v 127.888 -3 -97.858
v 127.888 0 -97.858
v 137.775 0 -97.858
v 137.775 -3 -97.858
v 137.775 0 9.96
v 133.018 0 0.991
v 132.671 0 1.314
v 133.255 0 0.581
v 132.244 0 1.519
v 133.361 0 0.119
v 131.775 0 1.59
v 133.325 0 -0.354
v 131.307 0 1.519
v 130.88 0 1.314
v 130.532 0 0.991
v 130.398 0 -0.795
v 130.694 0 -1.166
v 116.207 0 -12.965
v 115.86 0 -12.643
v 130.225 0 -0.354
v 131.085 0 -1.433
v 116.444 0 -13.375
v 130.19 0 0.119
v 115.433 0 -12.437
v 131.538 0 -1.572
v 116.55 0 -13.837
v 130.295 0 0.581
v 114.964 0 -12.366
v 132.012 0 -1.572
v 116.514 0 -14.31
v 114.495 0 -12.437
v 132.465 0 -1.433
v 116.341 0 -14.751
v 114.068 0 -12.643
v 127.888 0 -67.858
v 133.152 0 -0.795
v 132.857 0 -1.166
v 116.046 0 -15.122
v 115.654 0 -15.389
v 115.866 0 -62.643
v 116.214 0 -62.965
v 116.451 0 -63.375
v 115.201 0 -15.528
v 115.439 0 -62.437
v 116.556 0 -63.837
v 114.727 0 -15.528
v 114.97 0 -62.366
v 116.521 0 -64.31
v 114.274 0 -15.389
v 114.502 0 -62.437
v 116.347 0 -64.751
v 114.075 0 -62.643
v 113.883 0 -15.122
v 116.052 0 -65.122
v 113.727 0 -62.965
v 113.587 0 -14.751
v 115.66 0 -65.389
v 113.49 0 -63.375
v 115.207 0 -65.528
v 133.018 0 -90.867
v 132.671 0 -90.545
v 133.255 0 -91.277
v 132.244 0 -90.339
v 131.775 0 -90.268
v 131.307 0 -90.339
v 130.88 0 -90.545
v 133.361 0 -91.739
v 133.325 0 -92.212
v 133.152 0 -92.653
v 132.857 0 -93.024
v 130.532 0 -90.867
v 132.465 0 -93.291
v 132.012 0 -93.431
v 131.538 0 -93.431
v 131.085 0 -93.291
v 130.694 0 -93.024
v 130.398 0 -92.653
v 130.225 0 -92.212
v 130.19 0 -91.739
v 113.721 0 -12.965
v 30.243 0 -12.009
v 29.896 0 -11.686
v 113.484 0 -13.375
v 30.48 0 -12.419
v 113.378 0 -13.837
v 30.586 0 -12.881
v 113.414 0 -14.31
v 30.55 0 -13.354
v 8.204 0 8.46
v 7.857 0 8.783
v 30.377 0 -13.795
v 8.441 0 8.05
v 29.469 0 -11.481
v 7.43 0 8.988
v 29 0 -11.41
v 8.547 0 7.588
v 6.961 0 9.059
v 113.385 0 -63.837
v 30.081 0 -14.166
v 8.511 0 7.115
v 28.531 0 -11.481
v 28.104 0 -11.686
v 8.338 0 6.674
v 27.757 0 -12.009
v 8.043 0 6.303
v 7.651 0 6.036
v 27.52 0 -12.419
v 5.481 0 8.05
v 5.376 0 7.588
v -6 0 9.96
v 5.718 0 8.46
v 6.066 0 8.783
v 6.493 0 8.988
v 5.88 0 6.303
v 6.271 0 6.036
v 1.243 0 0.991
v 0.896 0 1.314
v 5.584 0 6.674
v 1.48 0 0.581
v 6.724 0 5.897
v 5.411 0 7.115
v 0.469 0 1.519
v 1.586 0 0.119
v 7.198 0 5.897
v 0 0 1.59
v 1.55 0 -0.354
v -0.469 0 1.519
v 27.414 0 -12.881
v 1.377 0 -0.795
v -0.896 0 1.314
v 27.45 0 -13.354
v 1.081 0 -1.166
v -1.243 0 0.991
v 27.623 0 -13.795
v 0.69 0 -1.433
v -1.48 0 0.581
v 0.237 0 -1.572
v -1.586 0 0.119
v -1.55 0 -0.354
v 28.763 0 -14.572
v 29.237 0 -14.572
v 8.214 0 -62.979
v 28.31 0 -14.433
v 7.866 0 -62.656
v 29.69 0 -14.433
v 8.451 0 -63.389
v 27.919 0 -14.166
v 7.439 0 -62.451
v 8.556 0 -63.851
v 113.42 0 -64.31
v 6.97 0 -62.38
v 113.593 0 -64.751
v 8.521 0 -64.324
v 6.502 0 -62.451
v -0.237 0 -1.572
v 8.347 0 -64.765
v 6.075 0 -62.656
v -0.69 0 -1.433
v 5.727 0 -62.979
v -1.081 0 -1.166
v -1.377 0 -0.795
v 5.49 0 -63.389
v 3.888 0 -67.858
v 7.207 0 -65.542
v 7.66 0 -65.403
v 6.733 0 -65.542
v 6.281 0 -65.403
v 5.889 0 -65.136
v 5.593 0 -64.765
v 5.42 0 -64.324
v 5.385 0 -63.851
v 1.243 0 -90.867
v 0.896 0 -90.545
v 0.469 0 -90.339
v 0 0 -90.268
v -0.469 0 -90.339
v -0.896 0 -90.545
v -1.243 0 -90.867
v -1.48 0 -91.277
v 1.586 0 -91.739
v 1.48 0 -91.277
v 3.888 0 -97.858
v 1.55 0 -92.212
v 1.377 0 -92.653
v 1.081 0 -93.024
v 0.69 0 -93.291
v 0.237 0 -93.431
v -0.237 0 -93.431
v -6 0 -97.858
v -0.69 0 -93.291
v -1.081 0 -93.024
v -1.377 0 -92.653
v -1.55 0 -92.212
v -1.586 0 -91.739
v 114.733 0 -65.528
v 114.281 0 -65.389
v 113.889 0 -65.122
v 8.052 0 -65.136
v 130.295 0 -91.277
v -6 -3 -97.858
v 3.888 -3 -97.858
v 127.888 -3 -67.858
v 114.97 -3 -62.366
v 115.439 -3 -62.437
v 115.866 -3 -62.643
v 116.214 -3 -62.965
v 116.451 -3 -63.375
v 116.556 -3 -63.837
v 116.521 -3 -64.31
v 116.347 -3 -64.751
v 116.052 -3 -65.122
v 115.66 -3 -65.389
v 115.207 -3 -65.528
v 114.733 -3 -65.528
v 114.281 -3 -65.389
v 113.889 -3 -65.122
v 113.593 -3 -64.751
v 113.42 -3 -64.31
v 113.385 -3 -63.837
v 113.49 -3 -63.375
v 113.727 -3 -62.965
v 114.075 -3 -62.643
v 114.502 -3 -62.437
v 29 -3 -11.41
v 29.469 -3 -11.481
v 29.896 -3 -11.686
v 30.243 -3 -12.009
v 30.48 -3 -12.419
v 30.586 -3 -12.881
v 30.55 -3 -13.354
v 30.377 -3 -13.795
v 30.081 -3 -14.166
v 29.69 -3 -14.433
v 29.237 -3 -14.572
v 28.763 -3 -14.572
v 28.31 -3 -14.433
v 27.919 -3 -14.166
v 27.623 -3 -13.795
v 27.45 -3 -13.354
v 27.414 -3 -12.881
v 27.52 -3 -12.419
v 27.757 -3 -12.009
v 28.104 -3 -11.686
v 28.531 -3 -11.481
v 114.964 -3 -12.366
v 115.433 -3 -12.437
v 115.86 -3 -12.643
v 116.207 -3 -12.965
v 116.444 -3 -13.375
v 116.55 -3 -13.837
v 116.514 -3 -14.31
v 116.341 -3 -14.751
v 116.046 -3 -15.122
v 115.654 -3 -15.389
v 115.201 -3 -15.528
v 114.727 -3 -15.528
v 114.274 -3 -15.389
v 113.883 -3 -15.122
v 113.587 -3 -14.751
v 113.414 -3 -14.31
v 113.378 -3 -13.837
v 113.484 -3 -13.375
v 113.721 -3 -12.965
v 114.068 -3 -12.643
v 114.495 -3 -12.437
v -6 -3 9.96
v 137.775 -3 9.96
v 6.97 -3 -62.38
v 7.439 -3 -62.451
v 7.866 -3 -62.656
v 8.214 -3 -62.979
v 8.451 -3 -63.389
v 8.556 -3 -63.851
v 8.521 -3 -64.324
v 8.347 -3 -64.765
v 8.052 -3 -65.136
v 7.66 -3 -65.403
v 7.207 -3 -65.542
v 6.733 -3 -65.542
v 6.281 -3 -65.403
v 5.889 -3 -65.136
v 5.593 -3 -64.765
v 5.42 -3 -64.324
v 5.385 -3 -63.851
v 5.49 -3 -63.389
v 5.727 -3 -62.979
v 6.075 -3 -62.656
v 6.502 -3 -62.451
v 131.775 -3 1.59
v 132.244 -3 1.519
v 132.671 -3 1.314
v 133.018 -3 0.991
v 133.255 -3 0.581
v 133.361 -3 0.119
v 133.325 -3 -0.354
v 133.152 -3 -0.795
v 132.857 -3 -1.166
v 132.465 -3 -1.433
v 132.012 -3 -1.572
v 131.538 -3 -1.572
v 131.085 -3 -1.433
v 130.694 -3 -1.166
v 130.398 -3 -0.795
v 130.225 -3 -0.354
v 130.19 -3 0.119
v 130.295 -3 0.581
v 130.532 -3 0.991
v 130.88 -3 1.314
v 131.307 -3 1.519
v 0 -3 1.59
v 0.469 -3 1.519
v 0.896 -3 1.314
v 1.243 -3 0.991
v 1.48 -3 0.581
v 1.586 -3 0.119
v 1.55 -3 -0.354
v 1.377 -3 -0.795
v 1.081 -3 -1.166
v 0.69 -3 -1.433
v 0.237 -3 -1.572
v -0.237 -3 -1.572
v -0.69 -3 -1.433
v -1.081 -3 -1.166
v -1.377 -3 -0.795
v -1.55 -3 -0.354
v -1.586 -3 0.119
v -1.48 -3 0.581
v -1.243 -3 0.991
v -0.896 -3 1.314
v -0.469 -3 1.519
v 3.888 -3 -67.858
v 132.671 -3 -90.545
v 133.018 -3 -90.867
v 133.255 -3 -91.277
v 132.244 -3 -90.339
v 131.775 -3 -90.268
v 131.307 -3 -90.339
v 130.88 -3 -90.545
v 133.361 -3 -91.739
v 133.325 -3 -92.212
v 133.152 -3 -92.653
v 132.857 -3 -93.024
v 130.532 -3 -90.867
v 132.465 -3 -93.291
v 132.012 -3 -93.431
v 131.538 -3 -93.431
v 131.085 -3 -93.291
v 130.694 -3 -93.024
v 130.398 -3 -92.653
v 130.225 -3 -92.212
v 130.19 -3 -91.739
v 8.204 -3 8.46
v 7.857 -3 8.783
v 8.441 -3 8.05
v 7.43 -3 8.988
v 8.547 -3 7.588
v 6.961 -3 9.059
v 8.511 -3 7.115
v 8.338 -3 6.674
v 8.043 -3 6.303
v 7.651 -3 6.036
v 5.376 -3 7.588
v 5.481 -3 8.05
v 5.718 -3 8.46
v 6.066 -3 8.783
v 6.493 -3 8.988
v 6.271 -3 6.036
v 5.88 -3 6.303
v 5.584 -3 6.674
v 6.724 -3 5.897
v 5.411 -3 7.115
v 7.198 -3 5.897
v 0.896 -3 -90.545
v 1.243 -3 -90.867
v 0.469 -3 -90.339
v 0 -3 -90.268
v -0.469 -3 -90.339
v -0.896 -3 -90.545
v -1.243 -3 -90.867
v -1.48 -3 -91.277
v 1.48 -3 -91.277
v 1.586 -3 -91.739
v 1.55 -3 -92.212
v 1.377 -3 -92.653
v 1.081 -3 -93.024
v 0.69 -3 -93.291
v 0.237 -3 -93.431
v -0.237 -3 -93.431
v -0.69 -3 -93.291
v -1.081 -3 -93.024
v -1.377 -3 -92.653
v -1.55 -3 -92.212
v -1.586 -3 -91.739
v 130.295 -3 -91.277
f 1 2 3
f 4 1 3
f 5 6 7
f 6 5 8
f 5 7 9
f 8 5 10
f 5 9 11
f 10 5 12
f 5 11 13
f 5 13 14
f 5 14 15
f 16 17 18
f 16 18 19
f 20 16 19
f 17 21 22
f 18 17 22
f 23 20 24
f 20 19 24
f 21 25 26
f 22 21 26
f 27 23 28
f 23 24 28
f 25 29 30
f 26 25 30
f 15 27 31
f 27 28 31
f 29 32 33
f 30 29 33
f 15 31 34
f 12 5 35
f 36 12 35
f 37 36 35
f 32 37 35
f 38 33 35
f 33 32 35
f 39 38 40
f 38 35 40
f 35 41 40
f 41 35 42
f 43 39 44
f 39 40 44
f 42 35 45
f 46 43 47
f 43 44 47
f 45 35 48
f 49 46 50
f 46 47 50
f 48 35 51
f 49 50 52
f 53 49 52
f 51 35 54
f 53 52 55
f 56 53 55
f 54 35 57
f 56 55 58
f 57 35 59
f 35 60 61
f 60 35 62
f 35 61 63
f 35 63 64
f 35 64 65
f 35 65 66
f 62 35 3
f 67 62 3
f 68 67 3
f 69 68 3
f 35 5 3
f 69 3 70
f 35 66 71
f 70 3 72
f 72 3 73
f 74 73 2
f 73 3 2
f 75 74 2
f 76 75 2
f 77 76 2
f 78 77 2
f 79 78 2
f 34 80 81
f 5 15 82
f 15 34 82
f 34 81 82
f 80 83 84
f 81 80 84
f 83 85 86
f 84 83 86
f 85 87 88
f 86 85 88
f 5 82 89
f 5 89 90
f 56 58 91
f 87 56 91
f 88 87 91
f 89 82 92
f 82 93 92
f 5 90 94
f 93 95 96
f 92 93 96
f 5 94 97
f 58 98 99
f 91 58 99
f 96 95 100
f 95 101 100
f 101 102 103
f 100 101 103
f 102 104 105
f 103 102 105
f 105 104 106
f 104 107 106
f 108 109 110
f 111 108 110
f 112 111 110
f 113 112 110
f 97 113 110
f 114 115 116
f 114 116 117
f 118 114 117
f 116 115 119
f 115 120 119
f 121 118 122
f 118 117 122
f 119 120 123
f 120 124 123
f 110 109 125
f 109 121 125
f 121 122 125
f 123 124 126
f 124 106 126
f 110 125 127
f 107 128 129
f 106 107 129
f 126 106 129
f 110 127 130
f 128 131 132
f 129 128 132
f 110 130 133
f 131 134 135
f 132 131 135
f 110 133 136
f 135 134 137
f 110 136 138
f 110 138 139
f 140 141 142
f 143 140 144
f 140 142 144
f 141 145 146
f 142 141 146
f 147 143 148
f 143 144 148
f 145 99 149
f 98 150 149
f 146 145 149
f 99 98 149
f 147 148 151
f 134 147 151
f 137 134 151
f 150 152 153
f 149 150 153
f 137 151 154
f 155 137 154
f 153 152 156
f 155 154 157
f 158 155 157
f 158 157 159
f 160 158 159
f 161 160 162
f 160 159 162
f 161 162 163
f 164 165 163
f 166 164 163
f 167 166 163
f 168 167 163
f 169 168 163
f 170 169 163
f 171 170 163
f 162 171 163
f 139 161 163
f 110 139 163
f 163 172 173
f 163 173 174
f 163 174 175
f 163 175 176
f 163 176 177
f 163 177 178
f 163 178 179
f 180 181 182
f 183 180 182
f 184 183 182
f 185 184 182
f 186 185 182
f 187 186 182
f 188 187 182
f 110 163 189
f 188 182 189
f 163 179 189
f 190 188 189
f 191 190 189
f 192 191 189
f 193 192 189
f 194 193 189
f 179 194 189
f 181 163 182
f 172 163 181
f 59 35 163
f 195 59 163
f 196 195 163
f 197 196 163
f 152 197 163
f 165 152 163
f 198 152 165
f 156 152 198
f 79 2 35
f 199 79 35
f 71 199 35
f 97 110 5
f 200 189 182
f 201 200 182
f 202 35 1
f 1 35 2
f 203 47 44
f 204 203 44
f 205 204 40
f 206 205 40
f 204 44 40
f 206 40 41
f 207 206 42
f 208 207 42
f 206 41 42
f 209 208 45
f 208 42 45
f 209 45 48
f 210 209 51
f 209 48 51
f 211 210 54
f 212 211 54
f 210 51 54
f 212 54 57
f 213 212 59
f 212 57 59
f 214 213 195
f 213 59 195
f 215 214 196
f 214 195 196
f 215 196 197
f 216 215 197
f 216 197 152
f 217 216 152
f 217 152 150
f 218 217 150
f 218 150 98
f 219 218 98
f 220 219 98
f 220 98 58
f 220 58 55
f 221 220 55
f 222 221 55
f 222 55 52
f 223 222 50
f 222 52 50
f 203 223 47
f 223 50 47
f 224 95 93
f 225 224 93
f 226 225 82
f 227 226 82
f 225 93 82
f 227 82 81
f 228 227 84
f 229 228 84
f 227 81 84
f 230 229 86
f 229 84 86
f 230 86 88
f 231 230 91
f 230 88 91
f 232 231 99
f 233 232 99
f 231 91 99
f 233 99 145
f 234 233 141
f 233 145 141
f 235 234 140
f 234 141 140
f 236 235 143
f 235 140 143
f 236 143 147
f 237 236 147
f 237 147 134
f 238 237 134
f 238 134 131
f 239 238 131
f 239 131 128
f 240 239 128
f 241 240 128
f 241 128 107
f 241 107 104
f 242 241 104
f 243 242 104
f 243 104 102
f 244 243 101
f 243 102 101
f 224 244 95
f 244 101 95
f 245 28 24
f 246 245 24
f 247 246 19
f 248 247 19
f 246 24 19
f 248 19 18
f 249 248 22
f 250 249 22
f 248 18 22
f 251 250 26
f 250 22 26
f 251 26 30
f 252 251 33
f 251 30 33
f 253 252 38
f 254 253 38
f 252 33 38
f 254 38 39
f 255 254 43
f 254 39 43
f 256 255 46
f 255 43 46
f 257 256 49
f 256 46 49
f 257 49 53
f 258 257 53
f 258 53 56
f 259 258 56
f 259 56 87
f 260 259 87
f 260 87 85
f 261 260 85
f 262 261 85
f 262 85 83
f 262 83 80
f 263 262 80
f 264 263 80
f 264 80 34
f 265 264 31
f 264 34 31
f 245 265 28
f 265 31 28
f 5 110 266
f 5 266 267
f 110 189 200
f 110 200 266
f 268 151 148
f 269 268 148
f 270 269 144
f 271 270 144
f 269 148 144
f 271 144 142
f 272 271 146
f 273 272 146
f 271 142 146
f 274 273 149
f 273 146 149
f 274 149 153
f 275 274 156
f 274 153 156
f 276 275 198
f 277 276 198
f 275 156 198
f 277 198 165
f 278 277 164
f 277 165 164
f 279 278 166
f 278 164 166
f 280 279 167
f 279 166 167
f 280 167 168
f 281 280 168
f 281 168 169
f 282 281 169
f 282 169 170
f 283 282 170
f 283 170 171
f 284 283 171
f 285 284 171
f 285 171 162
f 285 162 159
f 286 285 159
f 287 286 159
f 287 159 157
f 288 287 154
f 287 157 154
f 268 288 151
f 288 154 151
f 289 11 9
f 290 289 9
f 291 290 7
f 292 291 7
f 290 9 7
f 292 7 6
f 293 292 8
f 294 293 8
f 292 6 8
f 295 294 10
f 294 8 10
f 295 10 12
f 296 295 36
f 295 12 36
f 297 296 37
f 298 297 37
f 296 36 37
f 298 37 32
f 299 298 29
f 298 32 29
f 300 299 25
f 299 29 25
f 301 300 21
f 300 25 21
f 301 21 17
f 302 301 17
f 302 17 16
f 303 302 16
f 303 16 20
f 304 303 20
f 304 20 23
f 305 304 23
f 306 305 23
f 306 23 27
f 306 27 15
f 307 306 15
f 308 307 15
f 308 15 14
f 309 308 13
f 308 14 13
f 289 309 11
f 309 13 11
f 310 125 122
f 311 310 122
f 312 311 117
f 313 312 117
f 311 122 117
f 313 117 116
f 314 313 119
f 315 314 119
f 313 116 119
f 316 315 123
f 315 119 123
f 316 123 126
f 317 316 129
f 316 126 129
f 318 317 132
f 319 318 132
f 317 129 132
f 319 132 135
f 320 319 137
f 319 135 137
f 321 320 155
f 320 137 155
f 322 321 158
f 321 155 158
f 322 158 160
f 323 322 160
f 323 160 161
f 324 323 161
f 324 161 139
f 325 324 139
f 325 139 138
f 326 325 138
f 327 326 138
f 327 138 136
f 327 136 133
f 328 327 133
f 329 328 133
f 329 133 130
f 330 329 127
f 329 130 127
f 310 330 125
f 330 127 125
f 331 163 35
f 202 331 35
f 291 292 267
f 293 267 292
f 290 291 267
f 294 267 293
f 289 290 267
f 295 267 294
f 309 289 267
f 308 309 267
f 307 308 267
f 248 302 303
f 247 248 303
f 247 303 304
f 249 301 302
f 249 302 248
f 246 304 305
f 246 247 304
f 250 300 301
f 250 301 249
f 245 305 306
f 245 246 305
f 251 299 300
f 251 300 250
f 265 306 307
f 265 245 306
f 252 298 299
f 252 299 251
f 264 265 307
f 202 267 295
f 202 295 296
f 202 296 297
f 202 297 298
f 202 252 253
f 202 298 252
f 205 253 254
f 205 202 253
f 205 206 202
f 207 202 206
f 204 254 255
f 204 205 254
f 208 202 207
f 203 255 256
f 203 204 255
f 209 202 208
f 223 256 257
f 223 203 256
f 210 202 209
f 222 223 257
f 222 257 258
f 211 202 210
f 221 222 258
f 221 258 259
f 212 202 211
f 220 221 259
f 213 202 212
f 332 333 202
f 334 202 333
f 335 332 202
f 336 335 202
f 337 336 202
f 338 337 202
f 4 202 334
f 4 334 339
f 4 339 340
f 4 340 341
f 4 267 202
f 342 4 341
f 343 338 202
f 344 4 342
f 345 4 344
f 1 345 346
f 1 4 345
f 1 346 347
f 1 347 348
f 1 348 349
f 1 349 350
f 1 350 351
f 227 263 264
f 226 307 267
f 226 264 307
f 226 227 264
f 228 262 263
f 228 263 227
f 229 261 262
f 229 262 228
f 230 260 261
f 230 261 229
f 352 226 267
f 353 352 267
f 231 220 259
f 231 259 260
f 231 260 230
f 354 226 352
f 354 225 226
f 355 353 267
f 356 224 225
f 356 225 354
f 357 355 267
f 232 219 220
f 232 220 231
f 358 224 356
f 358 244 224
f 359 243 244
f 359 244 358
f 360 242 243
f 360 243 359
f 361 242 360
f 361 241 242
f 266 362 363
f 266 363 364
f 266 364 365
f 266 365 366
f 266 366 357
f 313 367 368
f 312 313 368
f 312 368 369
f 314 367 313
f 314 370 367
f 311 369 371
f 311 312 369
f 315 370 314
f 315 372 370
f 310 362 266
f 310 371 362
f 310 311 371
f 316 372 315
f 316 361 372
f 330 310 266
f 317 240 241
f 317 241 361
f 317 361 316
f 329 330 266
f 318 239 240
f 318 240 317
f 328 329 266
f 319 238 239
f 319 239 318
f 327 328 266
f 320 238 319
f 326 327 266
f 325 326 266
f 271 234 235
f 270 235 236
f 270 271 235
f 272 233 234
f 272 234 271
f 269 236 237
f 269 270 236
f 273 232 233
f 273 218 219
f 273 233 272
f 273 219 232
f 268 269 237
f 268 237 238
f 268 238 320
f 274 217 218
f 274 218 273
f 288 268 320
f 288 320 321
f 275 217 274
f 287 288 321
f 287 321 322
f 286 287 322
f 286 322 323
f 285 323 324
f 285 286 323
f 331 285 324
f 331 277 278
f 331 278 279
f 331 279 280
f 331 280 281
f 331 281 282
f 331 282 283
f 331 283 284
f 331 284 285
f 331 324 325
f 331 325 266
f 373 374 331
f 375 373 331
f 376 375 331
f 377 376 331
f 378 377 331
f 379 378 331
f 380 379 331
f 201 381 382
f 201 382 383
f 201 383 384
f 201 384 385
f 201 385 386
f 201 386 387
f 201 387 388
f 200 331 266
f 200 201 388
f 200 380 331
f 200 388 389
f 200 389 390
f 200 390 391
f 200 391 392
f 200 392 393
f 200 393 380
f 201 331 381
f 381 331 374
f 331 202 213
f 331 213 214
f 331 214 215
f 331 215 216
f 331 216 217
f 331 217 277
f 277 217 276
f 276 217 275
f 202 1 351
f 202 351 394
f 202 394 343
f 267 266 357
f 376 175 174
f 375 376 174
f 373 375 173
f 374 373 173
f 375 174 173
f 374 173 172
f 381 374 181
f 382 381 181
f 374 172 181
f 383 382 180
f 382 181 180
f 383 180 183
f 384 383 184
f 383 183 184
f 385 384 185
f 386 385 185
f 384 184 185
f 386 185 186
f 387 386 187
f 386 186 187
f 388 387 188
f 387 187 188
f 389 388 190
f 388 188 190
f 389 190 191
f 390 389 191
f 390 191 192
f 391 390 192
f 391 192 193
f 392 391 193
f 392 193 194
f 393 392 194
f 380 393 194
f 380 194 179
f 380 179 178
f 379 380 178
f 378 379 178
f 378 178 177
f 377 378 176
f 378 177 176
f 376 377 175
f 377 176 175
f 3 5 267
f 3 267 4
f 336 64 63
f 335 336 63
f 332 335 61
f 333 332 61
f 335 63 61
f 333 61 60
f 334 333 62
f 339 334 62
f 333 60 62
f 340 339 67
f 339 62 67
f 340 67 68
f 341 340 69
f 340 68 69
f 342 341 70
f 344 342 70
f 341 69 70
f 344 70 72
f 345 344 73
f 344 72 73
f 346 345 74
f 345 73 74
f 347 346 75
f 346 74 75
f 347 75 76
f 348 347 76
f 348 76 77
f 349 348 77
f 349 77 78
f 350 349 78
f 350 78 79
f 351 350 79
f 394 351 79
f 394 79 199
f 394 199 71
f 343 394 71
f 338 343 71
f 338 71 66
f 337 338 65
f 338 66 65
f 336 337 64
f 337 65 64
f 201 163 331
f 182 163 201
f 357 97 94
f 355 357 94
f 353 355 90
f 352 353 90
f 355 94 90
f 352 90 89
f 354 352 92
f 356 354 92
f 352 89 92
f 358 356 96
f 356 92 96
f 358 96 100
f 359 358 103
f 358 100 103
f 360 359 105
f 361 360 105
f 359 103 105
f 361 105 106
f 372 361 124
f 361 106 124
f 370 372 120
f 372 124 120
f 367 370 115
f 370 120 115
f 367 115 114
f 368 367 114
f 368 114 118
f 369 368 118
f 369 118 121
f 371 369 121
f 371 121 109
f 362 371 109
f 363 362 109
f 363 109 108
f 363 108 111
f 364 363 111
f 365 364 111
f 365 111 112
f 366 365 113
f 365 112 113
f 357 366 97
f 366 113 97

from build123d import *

# Parameters (mm, degrees)
SKETCH1_R      = 1.59
EXTRUDE1_DEPTH = 3
SKETCH2_W      = 124
SKETCH2_H      = 30
EXTRUDE2_DEPTH = 3
SKETCH3_R      = 1.59
EXTRUDE3_DEPTH = 3


with BuildPart() as part:
    # Sketch1 → Extrude1 (new body)
    with BuildSketch(Plane(origin=(0, 0, 0), x_dir=(1, 0, 0), z_dir=(0, 1, 0))):
        Polygon((-6, 97.8583), (137.7752, 97.8583), (137.7752, -6), (137.7752, -9.96), (131.7752, -9.96), (0, -9.96), (-6, -9.96), (-6, -6), align=None)
        with Locations(Location((0, 91.8583, 0), (0, 0, 270))):
            Circle(SKETCH1_R, mode=Mode.SUBTRACT)
        with Locations(Location((131.7752, 91.8583, 0), (0, 0, 270))):
            Circle(SKETCH1_R, mode=Mode.SUBTRACT)
        with Locations(Location((131.7752, 0, 0), (0, 0, 270))):
            Circle(SKETCH1_R, mode=Mode.SUBTRACT)
        with Locations(Location((0, 0, 0), (0, 0, 270))):
            Circle(SKETCH1_R, mode=Mode.SUBTRACT)
    extrude(amount=-EXTRUDE1_DEPTH)

    # Sketch2 → Extrude2 (cut)
    with BuildSketch(Plane(origin=(0, 0, 0), x_dir=(1, 0, 0), z_dir=(0, 1, 0))):
        with Locations((65.8876, 82.8583)):
            Rectangle(SKETCH2_W, SKETCH2_H)
    extrude(amount=-EXTRUDE2_DEPTH, mode=Mode.SUBTRACT)

    # Sketch3 → Extrude3 (cut)
    with BuildSketch(Plane(origin=(0, 0, 0), x_dir=(1, 0, 0), z_dir=(0, 1, 0))):
        with Locations(Location((6.961270646, -7.468844026, 0), (0, 0, 270))):
            Circle(SKETCH3_R)
        with Locations(Location((6.970466443, 63.970156522, 0), (0, 0, 270))):
            Circle(SKETCH3_R)
        with Locations(Location((114.970465448, 63.956254506, 0), (0, 0, 270))):
            Circle(SKETCH3_R)
        with Locations(Location((114.96402933, 13.95625332, 0), (0, 0, 270))):
            Circle(SKETCH3_R)
        with Locations(Location((29, 13, 0), (0, 0, 270))):
            Circle(SKETCH3_R)
    extrude(amount=-EXTRUDE3_DEPTH, mode=Mode.SUBTRACT)


solid = part.part
